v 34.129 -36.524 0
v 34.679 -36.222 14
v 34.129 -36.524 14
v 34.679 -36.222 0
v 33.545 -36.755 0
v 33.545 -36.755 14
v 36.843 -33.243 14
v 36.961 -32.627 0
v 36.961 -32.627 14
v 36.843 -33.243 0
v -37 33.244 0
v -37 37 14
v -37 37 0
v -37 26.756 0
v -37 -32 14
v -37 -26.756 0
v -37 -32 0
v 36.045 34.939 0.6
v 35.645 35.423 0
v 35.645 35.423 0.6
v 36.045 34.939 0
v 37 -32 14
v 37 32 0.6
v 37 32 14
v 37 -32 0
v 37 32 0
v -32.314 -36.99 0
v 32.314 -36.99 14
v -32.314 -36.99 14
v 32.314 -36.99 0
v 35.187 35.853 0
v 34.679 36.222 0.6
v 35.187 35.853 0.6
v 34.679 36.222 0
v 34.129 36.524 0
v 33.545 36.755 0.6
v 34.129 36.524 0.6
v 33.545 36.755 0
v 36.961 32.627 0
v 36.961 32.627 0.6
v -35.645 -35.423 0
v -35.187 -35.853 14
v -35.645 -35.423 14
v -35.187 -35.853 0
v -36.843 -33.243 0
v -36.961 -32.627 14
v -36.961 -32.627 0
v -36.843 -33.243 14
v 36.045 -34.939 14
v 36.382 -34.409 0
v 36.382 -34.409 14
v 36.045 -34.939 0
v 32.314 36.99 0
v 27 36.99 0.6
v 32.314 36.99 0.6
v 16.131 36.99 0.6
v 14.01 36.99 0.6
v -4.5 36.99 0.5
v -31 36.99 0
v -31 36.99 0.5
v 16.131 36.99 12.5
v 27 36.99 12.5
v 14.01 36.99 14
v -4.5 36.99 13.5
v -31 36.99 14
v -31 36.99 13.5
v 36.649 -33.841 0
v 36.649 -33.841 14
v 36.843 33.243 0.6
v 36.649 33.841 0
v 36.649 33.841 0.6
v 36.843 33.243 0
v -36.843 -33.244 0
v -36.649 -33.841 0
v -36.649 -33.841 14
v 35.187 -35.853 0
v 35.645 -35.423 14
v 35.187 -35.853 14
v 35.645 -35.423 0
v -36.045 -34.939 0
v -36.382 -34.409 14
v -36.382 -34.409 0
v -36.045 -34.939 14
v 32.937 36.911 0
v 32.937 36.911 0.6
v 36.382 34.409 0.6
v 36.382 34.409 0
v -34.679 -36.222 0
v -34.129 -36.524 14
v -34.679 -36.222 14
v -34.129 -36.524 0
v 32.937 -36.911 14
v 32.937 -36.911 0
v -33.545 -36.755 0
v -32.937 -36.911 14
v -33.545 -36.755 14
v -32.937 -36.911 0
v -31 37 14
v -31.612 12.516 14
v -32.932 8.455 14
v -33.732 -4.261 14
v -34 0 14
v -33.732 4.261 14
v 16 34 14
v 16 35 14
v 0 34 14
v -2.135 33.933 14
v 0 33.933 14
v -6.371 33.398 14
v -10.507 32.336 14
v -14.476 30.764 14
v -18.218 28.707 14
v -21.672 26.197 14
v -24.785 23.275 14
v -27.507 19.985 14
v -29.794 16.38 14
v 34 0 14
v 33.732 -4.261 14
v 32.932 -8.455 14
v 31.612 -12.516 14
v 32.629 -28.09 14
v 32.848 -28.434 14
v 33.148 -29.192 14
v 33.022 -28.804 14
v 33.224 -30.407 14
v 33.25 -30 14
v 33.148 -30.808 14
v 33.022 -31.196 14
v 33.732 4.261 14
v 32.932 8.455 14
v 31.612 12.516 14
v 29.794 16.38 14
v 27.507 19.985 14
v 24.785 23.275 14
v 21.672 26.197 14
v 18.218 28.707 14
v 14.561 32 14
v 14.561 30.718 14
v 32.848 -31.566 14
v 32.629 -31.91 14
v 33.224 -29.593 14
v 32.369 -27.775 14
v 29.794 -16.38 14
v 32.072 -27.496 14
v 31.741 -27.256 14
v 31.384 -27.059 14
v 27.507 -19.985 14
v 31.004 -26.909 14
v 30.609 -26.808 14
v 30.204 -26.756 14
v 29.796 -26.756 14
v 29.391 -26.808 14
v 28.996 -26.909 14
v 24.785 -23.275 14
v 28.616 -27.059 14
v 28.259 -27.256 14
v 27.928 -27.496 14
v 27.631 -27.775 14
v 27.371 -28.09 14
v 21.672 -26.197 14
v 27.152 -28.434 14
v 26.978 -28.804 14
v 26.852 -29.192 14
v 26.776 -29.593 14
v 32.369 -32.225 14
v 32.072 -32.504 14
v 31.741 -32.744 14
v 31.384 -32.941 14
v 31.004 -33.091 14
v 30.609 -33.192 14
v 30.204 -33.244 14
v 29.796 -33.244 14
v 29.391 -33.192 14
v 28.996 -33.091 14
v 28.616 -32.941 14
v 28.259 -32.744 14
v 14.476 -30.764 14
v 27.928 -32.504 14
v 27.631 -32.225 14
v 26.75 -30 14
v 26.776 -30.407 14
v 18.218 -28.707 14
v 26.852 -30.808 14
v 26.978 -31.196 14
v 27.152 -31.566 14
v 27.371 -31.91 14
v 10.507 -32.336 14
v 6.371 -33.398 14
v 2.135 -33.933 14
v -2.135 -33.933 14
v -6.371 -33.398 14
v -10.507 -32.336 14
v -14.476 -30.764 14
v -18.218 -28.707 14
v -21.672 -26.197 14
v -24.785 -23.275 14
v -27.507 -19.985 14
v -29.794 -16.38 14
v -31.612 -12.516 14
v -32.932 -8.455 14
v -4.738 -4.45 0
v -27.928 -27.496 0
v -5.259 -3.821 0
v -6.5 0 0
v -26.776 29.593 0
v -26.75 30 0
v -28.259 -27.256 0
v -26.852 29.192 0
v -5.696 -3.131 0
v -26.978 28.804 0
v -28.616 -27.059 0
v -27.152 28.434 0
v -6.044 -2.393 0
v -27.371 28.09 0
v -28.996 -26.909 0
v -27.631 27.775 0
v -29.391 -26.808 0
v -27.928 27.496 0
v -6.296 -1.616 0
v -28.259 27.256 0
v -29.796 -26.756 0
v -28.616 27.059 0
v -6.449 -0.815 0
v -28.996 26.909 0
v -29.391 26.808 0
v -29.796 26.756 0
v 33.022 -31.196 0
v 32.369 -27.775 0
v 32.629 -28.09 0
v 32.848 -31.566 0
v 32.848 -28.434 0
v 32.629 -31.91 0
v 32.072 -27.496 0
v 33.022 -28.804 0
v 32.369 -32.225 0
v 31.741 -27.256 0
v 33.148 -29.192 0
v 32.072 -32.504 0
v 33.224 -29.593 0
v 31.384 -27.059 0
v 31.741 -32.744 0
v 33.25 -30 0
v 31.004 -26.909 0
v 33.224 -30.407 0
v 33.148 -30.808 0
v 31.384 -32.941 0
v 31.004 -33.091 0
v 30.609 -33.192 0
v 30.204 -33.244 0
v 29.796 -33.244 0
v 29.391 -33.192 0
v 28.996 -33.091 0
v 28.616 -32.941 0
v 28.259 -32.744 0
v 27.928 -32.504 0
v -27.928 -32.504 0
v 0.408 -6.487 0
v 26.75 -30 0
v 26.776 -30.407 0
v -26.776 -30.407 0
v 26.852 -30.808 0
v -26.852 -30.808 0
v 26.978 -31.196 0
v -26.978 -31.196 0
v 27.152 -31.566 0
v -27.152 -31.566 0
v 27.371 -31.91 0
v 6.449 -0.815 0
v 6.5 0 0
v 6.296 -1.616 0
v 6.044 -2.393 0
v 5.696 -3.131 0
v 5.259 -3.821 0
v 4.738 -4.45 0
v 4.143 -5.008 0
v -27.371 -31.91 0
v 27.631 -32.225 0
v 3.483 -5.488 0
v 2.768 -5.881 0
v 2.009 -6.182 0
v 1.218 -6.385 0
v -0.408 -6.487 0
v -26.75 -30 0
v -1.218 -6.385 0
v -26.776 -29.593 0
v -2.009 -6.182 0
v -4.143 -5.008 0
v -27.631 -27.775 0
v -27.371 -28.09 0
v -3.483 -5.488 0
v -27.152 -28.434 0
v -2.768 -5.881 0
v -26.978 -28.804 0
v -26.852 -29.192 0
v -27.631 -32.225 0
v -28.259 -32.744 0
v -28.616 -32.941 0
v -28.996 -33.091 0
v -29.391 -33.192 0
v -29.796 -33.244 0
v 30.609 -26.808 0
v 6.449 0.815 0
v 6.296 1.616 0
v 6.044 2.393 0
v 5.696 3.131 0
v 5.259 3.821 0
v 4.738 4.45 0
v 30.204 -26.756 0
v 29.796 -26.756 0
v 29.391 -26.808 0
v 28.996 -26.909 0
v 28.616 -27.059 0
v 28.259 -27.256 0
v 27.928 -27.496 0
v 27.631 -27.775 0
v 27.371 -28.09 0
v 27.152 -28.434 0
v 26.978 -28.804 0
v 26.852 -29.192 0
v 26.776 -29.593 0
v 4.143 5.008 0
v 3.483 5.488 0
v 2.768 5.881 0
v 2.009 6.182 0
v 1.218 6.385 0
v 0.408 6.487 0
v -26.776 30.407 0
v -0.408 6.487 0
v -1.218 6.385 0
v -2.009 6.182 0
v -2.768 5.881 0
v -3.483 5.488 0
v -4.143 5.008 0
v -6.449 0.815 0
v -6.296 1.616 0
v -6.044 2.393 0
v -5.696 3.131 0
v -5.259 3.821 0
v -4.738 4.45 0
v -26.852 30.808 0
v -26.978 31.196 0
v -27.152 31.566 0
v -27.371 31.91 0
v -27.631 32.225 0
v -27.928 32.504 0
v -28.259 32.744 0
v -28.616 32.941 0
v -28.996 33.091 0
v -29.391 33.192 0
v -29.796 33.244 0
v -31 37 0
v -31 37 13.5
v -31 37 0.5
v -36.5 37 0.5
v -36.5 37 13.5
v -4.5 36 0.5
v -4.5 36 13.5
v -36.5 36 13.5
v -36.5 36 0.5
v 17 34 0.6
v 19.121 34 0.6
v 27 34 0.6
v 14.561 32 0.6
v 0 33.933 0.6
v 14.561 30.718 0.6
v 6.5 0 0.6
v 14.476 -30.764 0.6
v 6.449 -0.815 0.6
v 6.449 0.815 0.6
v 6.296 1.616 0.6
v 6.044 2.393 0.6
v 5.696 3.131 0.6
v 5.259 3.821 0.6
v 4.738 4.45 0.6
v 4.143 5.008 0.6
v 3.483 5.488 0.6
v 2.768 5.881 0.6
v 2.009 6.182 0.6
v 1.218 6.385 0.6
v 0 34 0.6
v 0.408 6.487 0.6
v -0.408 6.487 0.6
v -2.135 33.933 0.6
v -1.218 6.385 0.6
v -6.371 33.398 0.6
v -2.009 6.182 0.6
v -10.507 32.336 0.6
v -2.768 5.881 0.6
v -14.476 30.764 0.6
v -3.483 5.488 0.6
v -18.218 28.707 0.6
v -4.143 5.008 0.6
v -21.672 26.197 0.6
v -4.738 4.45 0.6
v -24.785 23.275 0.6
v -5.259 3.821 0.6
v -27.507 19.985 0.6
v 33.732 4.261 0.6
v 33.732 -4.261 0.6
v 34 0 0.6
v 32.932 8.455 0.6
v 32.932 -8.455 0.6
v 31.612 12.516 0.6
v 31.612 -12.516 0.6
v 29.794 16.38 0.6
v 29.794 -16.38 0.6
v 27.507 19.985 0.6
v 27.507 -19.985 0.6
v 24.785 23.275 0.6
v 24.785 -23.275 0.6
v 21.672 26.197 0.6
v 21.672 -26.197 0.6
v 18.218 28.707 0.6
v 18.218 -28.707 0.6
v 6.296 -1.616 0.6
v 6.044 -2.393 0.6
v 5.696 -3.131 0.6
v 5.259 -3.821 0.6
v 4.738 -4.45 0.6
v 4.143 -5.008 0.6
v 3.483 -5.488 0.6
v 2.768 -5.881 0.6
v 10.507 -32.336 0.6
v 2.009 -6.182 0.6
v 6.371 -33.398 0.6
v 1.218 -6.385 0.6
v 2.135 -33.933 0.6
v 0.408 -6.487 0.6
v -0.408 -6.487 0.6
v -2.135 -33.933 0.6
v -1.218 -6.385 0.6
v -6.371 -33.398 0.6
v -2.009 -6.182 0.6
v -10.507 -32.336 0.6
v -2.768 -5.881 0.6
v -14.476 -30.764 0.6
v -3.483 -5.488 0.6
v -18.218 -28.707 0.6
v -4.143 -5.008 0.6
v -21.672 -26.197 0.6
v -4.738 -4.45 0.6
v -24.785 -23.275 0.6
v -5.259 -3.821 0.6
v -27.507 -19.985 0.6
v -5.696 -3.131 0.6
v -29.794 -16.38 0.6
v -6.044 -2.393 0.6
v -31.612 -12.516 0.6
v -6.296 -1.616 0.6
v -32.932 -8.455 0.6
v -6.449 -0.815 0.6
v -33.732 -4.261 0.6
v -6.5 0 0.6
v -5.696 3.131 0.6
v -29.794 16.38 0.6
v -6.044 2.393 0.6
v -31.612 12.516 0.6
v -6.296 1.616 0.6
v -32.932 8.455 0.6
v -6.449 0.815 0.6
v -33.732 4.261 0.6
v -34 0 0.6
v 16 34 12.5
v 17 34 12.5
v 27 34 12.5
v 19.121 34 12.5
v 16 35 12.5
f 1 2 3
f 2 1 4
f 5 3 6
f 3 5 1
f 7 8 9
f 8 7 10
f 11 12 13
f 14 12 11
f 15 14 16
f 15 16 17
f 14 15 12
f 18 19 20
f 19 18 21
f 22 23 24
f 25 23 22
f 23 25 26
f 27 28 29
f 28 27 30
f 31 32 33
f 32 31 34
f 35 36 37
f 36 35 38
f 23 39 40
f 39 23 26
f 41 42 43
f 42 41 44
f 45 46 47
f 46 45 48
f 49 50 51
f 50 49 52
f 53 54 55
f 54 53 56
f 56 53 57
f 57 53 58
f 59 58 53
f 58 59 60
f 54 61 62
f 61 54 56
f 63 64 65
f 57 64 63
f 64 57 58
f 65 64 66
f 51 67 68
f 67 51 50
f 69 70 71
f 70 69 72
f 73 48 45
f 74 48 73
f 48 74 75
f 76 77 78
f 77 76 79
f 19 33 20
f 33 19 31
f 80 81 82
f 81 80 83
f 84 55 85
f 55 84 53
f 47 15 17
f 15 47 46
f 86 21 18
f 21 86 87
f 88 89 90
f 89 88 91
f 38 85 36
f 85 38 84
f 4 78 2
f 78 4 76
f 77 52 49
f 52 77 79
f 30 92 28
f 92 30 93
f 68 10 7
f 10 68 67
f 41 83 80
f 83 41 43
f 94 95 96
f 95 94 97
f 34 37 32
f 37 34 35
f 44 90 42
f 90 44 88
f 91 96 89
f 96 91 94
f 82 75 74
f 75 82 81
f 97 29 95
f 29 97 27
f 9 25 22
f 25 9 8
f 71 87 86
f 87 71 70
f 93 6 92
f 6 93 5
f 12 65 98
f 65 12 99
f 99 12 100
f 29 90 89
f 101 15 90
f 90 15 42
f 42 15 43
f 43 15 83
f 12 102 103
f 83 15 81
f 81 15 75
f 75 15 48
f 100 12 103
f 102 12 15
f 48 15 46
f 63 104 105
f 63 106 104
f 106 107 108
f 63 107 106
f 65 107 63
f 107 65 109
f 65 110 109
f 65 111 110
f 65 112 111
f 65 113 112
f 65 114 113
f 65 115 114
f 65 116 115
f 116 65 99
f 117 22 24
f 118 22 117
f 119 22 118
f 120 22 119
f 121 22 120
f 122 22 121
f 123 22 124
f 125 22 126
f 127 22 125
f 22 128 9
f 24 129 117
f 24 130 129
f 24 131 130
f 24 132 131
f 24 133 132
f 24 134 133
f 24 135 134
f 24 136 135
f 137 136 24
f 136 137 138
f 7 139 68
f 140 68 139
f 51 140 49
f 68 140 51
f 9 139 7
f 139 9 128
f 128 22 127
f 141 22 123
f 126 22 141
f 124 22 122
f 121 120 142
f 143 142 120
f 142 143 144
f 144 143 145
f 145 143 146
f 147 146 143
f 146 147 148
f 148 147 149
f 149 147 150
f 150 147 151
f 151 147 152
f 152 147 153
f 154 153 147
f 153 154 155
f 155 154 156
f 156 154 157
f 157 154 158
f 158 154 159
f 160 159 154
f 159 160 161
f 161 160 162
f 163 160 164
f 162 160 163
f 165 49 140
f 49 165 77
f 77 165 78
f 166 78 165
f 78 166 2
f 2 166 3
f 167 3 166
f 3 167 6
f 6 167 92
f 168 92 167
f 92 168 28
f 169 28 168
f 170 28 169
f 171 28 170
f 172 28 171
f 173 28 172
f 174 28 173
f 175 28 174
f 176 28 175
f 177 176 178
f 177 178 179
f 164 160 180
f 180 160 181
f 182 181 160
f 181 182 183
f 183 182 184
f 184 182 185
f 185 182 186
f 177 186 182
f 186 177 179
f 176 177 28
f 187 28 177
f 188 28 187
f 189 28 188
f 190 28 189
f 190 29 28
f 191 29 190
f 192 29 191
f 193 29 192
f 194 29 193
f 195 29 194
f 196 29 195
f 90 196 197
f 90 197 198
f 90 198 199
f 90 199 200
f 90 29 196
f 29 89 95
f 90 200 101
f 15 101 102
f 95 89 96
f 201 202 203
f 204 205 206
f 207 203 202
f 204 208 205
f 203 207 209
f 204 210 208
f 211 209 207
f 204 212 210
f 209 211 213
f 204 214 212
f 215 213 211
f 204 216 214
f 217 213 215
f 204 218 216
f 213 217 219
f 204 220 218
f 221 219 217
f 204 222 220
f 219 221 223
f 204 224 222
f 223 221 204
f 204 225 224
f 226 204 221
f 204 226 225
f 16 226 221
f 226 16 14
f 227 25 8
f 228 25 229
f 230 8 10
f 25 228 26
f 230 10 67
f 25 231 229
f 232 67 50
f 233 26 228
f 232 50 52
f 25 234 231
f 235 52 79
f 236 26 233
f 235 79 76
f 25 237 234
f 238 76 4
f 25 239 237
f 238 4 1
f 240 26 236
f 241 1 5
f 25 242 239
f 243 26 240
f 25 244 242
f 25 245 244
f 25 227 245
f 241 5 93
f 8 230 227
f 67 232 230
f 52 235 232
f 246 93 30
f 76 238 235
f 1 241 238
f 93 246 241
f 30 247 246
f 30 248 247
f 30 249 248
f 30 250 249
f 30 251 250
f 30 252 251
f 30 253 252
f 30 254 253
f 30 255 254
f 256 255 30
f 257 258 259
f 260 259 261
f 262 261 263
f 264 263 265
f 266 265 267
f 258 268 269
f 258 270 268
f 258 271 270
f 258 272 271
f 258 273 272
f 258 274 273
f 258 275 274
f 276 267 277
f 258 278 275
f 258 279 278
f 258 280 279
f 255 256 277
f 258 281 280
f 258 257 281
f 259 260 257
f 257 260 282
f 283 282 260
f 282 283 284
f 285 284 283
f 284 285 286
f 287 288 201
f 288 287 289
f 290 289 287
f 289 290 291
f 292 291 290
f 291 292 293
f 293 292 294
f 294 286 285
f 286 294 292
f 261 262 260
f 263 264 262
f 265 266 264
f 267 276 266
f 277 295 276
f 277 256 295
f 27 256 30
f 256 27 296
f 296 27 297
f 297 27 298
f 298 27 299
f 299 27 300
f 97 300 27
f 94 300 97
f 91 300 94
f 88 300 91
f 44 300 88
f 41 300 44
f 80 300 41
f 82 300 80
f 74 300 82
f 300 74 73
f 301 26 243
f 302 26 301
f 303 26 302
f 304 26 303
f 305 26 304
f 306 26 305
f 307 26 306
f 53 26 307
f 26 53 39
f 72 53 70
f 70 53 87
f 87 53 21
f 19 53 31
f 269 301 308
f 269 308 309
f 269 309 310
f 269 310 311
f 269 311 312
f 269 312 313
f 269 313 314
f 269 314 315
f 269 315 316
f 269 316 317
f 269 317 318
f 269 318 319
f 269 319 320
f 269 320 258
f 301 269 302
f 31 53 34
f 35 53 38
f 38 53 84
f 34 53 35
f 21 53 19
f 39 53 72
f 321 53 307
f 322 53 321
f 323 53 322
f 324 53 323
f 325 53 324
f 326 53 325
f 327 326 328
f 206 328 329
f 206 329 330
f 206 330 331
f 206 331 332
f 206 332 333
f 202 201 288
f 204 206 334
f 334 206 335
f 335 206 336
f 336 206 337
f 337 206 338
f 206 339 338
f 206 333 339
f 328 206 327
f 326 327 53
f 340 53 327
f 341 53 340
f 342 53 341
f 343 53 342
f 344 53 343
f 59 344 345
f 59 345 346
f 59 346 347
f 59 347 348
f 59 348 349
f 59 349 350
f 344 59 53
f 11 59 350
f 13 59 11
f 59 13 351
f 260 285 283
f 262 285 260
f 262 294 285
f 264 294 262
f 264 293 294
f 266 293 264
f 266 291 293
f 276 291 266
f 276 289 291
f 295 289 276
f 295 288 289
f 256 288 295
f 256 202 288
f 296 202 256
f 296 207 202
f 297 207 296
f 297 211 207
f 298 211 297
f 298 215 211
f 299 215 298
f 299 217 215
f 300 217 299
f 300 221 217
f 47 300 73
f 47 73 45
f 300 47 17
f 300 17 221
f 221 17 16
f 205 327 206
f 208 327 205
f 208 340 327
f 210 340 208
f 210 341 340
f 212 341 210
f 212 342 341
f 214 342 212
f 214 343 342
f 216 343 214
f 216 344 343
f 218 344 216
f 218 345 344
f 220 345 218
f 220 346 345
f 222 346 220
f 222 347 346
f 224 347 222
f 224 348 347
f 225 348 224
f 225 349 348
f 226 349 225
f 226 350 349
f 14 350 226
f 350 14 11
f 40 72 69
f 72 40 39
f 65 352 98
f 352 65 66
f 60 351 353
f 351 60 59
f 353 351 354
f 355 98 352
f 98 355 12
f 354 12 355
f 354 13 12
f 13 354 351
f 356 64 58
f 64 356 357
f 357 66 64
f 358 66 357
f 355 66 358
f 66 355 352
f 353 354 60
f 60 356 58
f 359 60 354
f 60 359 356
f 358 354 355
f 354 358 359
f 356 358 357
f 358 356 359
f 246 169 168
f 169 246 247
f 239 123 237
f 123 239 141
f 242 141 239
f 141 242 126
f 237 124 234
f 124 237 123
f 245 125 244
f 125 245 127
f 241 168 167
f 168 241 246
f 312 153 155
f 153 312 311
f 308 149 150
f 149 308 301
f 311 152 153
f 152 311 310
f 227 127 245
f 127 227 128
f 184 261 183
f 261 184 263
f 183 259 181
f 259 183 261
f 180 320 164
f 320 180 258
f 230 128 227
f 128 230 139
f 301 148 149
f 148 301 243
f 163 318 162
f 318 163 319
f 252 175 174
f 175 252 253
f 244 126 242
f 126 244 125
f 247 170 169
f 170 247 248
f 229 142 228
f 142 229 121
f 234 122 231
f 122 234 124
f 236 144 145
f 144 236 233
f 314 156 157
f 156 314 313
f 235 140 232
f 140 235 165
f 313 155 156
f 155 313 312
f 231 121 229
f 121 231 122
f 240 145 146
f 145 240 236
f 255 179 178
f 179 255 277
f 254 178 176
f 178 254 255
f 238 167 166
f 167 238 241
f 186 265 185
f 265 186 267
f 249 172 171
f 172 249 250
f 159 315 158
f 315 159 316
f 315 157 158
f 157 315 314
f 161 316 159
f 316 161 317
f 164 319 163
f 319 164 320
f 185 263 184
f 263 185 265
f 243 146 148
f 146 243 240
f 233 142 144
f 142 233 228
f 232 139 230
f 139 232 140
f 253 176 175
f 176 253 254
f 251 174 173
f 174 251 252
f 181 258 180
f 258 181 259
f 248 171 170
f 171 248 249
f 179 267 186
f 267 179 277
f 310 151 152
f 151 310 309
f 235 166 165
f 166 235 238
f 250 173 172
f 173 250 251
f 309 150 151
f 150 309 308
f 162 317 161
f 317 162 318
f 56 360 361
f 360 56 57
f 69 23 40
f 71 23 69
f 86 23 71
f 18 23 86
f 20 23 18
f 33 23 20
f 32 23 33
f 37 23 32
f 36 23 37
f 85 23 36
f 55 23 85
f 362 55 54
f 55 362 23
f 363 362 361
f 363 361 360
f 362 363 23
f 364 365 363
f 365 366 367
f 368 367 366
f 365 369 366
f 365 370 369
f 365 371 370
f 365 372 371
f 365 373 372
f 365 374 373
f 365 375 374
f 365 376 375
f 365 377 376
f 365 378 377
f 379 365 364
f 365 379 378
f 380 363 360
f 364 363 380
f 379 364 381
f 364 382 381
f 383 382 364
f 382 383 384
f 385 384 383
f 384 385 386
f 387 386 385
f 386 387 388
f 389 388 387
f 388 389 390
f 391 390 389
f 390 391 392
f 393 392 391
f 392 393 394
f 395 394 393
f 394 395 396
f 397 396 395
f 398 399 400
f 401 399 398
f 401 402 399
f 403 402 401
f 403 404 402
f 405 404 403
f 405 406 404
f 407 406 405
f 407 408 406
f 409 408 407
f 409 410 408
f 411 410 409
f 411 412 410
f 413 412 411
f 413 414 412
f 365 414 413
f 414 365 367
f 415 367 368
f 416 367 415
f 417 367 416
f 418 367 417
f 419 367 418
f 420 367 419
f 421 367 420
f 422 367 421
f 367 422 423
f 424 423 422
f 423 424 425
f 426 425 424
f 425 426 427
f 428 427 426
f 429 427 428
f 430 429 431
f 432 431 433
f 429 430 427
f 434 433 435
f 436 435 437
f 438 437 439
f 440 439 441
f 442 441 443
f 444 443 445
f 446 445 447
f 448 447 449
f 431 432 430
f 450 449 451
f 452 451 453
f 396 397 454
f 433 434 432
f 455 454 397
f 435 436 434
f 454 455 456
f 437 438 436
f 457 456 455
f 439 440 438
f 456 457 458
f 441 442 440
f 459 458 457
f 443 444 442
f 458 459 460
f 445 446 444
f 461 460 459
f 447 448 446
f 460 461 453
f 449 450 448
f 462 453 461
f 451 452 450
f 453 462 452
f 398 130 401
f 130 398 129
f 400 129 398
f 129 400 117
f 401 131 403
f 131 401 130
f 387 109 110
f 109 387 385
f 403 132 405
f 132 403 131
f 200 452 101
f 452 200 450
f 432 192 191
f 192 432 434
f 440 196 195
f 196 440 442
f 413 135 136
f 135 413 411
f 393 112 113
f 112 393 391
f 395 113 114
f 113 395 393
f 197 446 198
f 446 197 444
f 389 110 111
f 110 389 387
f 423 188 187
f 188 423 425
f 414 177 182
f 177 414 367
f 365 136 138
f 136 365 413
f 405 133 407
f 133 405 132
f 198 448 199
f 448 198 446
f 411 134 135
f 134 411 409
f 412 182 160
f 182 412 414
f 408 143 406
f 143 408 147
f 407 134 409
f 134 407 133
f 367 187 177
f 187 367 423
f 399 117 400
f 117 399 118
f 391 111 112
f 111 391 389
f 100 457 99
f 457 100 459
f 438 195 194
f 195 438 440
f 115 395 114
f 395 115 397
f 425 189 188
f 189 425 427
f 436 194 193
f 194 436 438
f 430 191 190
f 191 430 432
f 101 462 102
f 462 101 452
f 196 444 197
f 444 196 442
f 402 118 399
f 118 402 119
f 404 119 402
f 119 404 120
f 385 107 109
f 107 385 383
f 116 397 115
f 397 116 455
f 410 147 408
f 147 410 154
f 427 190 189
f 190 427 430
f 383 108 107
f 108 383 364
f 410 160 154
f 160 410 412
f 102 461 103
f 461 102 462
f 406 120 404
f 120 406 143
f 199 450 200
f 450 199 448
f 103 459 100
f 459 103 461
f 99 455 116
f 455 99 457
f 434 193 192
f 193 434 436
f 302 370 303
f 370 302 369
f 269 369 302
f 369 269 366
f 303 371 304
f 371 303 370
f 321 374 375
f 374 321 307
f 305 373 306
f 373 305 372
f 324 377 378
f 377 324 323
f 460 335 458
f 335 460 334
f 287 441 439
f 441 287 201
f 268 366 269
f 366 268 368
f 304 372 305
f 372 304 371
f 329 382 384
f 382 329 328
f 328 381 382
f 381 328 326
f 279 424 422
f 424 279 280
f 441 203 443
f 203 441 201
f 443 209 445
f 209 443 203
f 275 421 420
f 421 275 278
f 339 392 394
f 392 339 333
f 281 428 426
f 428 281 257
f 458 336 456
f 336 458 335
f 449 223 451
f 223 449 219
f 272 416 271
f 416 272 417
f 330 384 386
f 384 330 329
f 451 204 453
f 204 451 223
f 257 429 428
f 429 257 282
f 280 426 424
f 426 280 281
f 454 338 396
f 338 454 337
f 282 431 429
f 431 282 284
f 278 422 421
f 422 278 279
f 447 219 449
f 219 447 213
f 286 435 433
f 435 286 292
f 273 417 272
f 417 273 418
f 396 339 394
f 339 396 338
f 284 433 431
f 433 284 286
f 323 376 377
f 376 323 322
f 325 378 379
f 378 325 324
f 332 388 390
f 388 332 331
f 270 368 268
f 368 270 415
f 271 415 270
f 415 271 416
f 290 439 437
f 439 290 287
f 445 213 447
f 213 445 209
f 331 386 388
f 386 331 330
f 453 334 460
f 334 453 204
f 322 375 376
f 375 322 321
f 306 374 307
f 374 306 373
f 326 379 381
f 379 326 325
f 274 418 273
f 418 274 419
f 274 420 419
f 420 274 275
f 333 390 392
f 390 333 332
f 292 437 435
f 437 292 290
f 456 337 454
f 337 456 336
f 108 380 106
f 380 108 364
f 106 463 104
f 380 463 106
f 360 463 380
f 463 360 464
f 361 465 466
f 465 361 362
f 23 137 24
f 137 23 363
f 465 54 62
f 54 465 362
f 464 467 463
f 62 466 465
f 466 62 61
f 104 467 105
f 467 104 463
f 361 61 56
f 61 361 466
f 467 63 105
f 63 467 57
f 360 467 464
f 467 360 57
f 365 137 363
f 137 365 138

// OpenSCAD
$fn = 50;


difference() {
	union() {
		hull() {
			translate(v = [-32.0000000000, 32.0000000000, 0]) {
				cylinder(h = 14, r = 5);
			}
			translate(v = [32.0000000000, 32.0000000000, 0]) {
				cylinder(h = 14, r = 5);
			}
			translate(v = [-32.0000000000, -32.0000000000, 0]) {
				cylinder(h = 14, r = 5);
			}
			translate(v = [32.0000000000, -32.0000000000, 0]) {
				cylinder(h = 14, r = 5);
			}
		}
		translate(v = [-37.0000000000, 31.0000000000, 0]) {
			cube(size = [6, 6, 14]);
		}
	}
	union() {
		translate(v = [-37.5000000000, -30.0000000000, -250.0000000000]) {
			rotate(a = [0, 0, 0]) {
				difference() {
					union() {
						hull() {
							translate(v = [7.5000000000, 0, 0]) {
								cylinder(h = 250, r = 3.2500000000, r1 = 3.2500000000, r2 = 3.2500000000);
							}
							translate(v = [-7.5000000000, 0, 0]) {
								cylinder(h = 250, r = 3.2500000000, r1 = 3.2500000000, r2 = 3.2500000000);
							}
						}
					}
					union();
				}
			}
		}
		translate(v = [-37.5000000000, 30.0000000000, -250.0000000000]) {
			rotate(a = [0, 0, 0]) {
				difference() {
					union() {
						hull() {
							translate(v = [7.5000000000, 0, 0]) {
								cylinder(h = 250, r = 3.2500000000, r1 = 3.2500000000, r2 = 3.2500000000);
							}
							translate(v = [-7.5000000000, 0, 0]) {
								cylinder(h = 250, r = 3.2500000000, r1 = 3.2500000000, r2 = 3.2500000000);
							}
						}
					}
					union();
				}
			}
		}
		translate(v = [-36.5000000000, 36.0000000000, 0.5000000000]) {
			cube(size = [32, 1, 13.0000000000]);
		}
		translate(v = [30.0000000000, -30.0000000000, -50.0000000000]) {
			cylinder(h = 100, r = 3.2500000000);
		}
		translate(v = [0, 0, 0.6000000000]) {
			cylinder(h = 16.4000000000, r = 34.0000000000);
		}
		translate(v = [0, 0, -7.0000000000]) {
			cylinder(h = 14, r = 6.5000000000);
		}
		translate(v = [0.0000000000, 32.0000000000, 0.6000000000]) {
			cube(size = [37.0000000000, 2, 16.4000000000]);
		}
		translate(v = [27.0000000000, 32.0000000000, 0.6000000000]) {
			cube(size = [10, 5, 16.4000000000]);
		}
		translate(v = [16.0000000000, 32.0000000000, 12.5000000000]) {
			cube(size = [21, 5, 1.5000000000]);
		}
		translate(v = [13.2500000000, 37.7500000000, 0.6000000000]) {
			rotate(a = [0, 0, -45]) {
				cube(size = [7.5000000000, 1.5000000000, 16.4000000000]);
			}
		}
		translate(v = [7.0610000000, 30.0000000000, 0.6000000000]) {
			cube(size = [7.5000000000, 2, 13.4000000000]);
		}
	}
}
